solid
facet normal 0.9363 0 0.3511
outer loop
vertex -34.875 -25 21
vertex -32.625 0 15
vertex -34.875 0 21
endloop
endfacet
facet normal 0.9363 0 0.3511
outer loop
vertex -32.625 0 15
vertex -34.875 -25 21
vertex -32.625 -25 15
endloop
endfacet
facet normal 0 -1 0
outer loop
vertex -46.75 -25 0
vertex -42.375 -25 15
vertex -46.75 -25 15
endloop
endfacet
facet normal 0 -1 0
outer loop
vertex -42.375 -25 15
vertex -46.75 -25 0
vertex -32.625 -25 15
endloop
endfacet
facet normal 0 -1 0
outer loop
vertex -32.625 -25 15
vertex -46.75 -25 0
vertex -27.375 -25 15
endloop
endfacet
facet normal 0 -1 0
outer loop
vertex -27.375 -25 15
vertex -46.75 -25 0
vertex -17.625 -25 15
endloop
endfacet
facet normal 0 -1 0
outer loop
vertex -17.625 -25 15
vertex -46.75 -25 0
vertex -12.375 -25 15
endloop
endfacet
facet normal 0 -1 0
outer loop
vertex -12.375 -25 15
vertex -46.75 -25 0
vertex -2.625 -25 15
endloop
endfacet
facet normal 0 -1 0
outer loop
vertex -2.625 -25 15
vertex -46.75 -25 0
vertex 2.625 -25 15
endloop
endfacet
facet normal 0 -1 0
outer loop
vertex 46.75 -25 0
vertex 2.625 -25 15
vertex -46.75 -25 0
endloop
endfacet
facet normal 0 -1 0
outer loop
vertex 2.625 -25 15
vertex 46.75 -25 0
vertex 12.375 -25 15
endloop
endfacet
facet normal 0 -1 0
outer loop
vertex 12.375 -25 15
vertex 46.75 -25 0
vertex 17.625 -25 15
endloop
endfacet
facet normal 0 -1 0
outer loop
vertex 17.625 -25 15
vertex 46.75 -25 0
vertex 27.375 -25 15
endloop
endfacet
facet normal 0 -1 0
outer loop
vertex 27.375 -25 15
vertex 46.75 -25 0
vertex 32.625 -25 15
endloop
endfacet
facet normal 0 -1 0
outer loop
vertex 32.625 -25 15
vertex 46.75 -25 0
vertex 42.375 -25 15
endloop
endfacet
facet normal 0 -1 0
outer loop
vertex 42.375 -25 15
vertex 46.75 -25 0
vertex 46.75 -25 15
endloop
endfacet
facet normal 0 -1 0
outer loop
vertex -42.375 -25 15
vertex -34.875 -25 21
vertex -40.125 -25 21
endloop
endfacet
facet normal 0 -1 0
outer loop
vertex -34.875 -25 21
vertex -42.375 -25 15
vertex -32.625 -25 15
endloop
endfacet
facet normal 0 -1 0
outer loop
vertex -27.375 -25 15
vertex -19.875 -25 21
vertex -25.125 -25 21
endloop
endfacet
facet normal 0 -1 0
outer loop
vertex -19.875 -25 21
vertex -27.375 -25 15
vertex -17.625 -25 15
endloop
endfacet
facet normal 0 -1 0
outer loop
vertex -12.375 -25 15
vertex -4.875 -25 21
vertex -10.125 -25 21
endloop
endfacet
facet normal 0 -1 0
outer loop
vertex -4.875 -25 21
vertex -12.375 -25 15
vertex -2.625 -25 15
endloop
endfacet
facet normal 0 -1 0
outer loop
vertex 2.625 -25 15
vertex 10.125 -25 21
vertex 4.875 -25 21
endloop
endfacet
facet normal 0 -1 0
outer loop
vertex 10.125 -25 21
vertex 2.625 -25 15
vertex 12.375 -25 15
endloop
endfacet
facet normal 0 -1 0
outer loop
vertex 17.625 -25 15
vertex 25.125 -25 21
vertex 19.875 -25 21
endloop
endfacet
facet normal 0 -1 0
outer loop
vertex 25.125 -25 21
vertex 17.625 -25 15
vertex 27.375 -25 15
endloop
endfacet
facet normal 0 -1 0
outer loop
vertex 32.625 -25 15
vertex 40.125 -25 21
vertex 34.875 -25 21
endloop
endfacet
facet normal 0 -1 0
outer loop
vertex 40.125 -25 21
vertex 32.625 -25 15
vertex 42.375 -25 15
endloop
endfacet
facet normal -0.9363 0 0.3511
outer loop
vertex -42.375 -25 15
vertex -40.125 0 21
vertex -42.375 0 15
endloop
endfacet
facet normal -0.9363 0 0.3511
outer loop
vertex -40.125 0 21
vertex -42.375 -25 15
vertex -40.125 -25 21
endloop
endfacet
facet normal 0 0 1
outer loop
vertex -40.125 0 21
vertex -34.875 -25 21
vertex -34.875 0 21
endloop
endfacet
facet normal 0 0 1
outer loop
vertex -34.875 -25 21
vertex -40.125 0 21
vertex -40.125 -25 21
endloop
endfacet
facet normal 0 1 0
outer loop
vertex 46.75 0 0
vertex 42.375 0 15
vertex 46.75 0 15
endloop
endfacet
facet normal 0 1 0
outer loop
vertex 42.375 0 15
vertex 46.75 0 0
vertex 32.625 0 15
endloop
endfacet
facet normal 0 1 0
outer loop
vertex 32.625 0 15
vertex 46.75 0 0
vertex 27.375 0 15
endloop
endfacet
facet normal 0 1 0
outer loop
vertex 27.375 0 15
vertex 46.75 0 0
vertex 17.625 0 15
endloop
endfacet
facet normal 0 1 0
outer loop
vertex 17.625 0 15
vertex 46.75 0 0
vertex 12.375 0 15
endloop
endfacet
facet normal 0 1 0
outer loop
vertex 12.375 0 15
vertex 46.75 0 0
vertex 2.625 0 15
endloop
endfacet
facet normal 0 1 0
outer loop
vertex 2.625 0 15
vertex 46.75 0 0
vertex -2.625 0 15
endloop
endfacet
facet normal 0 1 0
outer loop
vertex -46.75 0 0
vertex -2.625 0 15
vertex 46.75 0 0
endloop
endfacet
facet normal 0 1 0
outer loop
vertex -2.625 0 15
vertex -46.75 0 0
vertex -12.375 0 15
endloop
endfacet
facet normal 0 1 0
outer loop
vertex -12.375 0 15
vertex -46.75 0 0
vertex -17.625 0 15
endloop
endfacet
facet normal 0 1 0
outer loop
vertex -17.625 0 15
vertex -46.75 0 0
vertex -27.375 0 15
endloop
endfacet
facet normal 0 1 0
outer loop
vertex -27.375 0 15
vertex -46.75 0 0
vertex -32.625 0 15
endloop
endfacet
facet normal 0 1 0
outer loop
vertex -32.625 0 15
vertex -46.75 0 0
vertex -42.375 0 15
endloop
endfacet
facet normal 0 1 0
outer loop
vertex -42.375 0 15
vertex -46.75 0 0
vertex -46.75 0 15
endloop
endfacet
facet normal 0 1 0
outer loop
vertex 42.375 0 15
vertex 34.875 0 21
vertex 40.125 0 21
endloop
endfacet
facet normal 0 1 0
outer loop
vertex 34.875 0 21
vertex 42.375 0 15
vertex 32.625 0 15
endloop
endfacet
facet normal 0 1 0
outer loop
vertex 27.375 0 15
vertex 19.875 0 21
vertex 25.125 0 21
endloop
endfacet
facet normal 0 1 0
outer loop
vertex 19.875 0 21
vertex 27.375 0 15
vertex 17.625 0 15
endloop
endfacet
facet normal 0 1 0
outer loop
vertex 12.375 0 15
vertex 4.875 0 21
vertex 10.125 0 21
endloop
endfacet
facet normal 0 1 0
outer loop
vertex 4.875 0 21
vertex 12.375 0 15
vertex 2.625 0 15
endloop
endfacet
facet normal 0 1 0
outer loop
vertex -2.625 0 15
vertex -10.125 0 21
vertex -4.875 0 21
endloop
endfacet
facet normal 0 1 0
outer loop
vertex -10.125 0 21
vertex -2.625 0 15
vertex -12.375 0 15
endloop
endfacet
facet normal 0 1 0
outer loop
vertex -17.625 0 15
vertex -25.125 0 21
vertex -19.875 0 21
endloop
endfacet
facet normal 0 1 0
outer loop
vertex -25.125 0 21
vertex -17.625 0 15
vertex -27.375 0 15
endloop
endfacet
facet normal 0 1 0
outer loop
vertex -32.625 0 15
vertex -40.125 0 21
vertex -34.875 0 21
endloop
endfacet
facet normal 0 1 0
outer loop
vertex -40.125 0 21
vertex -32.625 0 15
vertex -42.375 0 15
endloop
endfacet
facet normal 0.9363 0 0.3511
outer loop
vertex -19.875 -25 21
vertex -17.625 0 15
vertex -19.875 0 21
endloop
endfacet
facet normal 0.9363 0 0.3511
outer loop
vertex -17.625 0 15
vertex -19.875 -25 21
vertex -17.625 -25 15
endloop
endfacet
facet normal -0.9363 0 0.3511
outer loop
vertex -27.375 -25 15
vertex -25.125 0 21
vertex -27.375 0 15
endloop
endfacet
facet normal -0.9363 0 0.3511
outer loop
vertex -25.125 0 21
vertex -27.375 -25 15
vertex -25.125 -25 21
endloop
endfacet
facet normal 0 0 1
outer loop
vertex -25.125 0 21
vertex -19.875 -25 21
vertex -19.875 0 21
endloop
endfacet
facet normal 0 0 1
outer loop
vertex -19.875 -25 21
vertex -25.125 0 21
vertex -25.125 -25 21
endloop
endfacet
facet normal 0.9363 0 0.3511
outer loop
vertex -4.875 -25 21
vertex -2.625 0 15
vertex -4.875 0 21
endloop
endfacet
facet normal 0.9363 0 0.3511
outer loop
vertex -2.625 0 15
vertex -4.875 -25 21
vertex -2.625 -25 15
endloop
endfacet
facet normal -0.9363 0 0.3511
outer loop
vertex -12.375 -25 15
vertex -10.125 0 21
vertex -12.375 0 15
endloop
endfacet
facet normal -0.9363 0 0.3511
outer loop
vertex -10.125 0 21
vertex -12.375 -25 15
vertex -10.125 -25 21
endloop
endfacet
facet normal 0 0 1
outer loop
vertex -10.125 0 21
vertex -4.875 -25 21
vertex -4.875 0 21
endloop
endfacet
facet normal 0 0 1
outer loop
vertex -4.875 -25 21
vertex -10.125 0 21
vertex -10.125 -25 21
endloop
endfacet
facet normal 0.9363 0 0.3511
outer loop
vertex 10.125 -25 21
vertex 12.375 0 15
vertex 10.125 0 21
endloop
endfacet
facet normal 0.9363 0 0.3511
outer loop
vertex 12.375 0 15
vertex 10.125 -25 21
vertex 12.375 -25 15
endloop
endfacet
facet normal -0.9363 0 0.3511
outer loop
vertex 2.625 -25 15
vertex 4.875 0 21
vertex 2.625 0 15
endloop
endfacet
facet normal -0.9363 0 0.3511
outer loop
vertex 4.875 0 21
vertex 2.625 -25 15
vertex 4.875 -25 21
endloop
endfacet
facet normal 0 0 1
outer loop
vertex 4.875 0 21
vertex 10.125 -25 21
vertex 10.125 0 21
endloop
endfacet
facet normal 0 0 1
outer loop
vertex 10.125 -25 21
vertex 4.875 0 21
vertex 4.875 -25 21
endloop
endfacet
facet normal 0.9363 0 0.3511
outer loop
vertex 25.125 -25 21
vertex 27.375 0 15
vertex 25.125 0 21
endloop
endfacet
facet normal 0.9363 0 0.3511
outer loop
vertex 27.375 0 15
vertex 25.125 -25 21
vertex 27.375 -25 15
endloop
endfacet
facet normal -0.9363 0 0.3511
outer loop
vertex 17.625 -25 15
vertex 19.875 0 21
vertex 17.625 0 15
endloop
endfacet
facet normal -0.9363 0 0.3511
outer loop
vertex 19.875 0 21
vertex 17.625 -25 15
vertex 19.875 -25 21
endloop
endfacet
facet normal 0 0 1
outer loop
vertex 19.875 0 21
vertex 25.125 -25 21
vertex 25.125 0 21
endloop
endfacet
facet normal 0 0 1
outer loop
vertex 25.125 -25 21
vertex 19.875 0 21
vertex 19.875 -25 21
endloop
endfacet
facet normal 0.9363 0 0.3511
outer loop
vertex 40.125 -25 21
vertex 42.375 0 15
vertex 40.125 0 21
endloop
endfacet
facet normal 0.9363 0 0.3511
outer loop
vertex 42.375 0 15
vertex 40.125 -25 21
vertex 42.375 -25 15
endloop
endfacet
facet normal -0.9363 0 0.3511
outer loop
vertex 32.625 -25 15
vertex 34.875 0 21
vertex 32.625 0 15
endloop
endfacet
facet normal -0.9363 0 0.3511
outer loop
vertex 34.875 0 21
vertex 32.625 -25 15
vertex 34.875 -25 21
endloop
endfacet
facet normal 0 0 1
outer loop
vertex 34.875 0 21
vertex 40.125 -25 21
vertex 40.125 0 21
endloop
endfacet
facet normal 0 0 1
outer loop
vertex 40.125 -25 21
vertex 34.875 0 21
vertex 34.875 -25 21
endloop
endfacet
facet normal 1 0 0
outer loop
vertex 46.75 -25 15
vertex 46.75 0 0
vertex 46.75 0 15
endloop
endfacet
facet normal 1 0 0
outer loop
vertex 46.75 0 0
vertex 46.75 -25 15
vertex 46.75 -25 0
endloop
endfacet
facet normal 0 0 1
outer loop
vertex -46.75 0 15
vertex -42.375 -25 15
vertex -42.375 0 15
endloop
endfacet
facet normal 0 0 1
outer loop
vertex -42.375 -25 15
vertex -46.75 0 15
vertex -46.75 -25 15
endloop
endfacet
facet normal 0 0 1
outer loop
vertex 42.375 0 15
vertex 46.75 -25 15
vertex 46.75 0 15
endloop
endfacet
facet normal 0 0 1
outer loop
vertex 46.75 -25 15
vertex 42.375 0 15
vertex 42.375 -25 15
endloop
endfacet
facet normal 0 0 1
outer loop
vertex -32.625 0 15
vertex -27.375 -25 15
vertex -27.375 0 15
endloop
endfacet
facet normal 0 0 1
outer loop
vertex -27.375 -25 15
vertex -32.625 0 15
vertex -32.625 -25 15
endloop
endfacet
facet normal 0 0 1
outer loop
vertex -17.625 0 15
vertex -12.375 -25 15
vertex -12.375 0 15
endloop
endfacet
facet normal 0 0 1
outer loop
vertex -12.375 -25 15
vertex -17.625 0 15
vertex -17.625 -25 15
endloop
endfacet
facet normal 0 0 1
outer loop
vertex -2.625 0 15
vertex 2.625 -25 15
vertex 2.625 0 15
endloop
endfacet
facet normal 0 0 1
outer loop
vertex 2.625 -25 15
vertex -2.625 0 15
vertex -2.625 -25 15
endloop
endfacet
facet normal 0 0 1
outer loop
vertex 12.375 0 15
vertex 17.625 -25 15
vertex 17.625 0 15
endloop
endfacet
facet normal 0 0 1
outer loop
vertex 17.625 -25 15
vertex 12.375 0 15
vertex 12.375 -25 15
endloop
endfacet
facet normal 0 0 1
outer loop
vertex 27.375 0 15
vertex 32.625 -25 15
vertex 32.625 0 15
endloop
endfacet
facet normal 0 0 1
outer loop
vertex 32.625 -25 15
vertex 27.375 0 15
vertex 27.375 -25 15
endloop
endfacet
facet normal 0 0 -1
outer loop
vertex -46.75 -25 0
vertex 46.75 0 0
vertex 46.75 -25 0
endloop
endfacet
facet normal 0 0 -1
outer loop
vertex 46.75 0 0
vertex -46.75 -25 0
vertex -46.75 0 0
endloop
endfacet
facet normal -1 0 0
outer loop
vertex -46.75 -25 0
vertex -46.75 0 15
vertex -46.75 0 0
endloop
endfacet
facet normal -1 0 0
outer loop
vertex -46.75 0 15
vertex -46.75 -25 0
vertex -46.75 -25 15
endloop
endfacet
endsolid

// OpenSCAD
$fn = 32;

// ----------------------------------------------------------------------
// Toothed rack, 6 teeth
// 15 mm pitch, 6 mm teeth
// ----------------------------------------------------------------------

// --- parameters (mm) ---
bar_w = 25;      // bar width (Y)
bar_h = 15;      // bar height (Z)
teeth = 6;       // number of teeth
pitch = 15;      // tooth pitch
tooth_h = 6;     // tooth height above the bar
root_w = 10.5;   // tooth width at the root
crest_w = 5.25;  // tooth width at the crest

// --- derived feature positions (mm) ---
span = (teeth - 1) * pitch;  // = 75   distance between the outer teeth
bar_l = span + root_w + 8;   // = 93.5   bar length: teeth plus 4 mm at each end
tooth_x = -span / 2;         // = -37.5   X of the first tooth
height = bar_h + tooth_h;    // = 21   overall height
feature_centers = [
  [tooth_x + 0 * pitch, -bar_w / 2],
  [tooth_x + 1 * pitch, -bar_w / 2],
  [tooth_x + 2 * pitch, -bar_w / 2],
  [tooth_x + 3 * pitch, -bar_w / 2],
  [tooth_x + 4 * pitch, -bar_w / 2],
  [tooth_x + 5 * pitch, -bar_w / 2]
];   // tooth centre line, drives the tooth loop

// bar with a rack of teeth, one extruded trapezoium per centre
module rack_tooth() {
  linear_extrude(height = bar_w)
    polygon(points = [
      [0, 0],
      [root_w, 0],
      [root_w / 2 + crest_w / 2, tooth_h + 1],
      [root_w / 2 - crest_w / 2, tooth_h + 1]
    ]);
}

union() {
  translate([-bar_l / 2, -bar_w, 0]) cube([bar_l, bar_w, bar_h]);
  for (centre = feature_centers)
    translate([centre[0] - root_w / 2, 0, bar_h - 1]) rotate([90, 0, 0]) rack_tooth();
}
